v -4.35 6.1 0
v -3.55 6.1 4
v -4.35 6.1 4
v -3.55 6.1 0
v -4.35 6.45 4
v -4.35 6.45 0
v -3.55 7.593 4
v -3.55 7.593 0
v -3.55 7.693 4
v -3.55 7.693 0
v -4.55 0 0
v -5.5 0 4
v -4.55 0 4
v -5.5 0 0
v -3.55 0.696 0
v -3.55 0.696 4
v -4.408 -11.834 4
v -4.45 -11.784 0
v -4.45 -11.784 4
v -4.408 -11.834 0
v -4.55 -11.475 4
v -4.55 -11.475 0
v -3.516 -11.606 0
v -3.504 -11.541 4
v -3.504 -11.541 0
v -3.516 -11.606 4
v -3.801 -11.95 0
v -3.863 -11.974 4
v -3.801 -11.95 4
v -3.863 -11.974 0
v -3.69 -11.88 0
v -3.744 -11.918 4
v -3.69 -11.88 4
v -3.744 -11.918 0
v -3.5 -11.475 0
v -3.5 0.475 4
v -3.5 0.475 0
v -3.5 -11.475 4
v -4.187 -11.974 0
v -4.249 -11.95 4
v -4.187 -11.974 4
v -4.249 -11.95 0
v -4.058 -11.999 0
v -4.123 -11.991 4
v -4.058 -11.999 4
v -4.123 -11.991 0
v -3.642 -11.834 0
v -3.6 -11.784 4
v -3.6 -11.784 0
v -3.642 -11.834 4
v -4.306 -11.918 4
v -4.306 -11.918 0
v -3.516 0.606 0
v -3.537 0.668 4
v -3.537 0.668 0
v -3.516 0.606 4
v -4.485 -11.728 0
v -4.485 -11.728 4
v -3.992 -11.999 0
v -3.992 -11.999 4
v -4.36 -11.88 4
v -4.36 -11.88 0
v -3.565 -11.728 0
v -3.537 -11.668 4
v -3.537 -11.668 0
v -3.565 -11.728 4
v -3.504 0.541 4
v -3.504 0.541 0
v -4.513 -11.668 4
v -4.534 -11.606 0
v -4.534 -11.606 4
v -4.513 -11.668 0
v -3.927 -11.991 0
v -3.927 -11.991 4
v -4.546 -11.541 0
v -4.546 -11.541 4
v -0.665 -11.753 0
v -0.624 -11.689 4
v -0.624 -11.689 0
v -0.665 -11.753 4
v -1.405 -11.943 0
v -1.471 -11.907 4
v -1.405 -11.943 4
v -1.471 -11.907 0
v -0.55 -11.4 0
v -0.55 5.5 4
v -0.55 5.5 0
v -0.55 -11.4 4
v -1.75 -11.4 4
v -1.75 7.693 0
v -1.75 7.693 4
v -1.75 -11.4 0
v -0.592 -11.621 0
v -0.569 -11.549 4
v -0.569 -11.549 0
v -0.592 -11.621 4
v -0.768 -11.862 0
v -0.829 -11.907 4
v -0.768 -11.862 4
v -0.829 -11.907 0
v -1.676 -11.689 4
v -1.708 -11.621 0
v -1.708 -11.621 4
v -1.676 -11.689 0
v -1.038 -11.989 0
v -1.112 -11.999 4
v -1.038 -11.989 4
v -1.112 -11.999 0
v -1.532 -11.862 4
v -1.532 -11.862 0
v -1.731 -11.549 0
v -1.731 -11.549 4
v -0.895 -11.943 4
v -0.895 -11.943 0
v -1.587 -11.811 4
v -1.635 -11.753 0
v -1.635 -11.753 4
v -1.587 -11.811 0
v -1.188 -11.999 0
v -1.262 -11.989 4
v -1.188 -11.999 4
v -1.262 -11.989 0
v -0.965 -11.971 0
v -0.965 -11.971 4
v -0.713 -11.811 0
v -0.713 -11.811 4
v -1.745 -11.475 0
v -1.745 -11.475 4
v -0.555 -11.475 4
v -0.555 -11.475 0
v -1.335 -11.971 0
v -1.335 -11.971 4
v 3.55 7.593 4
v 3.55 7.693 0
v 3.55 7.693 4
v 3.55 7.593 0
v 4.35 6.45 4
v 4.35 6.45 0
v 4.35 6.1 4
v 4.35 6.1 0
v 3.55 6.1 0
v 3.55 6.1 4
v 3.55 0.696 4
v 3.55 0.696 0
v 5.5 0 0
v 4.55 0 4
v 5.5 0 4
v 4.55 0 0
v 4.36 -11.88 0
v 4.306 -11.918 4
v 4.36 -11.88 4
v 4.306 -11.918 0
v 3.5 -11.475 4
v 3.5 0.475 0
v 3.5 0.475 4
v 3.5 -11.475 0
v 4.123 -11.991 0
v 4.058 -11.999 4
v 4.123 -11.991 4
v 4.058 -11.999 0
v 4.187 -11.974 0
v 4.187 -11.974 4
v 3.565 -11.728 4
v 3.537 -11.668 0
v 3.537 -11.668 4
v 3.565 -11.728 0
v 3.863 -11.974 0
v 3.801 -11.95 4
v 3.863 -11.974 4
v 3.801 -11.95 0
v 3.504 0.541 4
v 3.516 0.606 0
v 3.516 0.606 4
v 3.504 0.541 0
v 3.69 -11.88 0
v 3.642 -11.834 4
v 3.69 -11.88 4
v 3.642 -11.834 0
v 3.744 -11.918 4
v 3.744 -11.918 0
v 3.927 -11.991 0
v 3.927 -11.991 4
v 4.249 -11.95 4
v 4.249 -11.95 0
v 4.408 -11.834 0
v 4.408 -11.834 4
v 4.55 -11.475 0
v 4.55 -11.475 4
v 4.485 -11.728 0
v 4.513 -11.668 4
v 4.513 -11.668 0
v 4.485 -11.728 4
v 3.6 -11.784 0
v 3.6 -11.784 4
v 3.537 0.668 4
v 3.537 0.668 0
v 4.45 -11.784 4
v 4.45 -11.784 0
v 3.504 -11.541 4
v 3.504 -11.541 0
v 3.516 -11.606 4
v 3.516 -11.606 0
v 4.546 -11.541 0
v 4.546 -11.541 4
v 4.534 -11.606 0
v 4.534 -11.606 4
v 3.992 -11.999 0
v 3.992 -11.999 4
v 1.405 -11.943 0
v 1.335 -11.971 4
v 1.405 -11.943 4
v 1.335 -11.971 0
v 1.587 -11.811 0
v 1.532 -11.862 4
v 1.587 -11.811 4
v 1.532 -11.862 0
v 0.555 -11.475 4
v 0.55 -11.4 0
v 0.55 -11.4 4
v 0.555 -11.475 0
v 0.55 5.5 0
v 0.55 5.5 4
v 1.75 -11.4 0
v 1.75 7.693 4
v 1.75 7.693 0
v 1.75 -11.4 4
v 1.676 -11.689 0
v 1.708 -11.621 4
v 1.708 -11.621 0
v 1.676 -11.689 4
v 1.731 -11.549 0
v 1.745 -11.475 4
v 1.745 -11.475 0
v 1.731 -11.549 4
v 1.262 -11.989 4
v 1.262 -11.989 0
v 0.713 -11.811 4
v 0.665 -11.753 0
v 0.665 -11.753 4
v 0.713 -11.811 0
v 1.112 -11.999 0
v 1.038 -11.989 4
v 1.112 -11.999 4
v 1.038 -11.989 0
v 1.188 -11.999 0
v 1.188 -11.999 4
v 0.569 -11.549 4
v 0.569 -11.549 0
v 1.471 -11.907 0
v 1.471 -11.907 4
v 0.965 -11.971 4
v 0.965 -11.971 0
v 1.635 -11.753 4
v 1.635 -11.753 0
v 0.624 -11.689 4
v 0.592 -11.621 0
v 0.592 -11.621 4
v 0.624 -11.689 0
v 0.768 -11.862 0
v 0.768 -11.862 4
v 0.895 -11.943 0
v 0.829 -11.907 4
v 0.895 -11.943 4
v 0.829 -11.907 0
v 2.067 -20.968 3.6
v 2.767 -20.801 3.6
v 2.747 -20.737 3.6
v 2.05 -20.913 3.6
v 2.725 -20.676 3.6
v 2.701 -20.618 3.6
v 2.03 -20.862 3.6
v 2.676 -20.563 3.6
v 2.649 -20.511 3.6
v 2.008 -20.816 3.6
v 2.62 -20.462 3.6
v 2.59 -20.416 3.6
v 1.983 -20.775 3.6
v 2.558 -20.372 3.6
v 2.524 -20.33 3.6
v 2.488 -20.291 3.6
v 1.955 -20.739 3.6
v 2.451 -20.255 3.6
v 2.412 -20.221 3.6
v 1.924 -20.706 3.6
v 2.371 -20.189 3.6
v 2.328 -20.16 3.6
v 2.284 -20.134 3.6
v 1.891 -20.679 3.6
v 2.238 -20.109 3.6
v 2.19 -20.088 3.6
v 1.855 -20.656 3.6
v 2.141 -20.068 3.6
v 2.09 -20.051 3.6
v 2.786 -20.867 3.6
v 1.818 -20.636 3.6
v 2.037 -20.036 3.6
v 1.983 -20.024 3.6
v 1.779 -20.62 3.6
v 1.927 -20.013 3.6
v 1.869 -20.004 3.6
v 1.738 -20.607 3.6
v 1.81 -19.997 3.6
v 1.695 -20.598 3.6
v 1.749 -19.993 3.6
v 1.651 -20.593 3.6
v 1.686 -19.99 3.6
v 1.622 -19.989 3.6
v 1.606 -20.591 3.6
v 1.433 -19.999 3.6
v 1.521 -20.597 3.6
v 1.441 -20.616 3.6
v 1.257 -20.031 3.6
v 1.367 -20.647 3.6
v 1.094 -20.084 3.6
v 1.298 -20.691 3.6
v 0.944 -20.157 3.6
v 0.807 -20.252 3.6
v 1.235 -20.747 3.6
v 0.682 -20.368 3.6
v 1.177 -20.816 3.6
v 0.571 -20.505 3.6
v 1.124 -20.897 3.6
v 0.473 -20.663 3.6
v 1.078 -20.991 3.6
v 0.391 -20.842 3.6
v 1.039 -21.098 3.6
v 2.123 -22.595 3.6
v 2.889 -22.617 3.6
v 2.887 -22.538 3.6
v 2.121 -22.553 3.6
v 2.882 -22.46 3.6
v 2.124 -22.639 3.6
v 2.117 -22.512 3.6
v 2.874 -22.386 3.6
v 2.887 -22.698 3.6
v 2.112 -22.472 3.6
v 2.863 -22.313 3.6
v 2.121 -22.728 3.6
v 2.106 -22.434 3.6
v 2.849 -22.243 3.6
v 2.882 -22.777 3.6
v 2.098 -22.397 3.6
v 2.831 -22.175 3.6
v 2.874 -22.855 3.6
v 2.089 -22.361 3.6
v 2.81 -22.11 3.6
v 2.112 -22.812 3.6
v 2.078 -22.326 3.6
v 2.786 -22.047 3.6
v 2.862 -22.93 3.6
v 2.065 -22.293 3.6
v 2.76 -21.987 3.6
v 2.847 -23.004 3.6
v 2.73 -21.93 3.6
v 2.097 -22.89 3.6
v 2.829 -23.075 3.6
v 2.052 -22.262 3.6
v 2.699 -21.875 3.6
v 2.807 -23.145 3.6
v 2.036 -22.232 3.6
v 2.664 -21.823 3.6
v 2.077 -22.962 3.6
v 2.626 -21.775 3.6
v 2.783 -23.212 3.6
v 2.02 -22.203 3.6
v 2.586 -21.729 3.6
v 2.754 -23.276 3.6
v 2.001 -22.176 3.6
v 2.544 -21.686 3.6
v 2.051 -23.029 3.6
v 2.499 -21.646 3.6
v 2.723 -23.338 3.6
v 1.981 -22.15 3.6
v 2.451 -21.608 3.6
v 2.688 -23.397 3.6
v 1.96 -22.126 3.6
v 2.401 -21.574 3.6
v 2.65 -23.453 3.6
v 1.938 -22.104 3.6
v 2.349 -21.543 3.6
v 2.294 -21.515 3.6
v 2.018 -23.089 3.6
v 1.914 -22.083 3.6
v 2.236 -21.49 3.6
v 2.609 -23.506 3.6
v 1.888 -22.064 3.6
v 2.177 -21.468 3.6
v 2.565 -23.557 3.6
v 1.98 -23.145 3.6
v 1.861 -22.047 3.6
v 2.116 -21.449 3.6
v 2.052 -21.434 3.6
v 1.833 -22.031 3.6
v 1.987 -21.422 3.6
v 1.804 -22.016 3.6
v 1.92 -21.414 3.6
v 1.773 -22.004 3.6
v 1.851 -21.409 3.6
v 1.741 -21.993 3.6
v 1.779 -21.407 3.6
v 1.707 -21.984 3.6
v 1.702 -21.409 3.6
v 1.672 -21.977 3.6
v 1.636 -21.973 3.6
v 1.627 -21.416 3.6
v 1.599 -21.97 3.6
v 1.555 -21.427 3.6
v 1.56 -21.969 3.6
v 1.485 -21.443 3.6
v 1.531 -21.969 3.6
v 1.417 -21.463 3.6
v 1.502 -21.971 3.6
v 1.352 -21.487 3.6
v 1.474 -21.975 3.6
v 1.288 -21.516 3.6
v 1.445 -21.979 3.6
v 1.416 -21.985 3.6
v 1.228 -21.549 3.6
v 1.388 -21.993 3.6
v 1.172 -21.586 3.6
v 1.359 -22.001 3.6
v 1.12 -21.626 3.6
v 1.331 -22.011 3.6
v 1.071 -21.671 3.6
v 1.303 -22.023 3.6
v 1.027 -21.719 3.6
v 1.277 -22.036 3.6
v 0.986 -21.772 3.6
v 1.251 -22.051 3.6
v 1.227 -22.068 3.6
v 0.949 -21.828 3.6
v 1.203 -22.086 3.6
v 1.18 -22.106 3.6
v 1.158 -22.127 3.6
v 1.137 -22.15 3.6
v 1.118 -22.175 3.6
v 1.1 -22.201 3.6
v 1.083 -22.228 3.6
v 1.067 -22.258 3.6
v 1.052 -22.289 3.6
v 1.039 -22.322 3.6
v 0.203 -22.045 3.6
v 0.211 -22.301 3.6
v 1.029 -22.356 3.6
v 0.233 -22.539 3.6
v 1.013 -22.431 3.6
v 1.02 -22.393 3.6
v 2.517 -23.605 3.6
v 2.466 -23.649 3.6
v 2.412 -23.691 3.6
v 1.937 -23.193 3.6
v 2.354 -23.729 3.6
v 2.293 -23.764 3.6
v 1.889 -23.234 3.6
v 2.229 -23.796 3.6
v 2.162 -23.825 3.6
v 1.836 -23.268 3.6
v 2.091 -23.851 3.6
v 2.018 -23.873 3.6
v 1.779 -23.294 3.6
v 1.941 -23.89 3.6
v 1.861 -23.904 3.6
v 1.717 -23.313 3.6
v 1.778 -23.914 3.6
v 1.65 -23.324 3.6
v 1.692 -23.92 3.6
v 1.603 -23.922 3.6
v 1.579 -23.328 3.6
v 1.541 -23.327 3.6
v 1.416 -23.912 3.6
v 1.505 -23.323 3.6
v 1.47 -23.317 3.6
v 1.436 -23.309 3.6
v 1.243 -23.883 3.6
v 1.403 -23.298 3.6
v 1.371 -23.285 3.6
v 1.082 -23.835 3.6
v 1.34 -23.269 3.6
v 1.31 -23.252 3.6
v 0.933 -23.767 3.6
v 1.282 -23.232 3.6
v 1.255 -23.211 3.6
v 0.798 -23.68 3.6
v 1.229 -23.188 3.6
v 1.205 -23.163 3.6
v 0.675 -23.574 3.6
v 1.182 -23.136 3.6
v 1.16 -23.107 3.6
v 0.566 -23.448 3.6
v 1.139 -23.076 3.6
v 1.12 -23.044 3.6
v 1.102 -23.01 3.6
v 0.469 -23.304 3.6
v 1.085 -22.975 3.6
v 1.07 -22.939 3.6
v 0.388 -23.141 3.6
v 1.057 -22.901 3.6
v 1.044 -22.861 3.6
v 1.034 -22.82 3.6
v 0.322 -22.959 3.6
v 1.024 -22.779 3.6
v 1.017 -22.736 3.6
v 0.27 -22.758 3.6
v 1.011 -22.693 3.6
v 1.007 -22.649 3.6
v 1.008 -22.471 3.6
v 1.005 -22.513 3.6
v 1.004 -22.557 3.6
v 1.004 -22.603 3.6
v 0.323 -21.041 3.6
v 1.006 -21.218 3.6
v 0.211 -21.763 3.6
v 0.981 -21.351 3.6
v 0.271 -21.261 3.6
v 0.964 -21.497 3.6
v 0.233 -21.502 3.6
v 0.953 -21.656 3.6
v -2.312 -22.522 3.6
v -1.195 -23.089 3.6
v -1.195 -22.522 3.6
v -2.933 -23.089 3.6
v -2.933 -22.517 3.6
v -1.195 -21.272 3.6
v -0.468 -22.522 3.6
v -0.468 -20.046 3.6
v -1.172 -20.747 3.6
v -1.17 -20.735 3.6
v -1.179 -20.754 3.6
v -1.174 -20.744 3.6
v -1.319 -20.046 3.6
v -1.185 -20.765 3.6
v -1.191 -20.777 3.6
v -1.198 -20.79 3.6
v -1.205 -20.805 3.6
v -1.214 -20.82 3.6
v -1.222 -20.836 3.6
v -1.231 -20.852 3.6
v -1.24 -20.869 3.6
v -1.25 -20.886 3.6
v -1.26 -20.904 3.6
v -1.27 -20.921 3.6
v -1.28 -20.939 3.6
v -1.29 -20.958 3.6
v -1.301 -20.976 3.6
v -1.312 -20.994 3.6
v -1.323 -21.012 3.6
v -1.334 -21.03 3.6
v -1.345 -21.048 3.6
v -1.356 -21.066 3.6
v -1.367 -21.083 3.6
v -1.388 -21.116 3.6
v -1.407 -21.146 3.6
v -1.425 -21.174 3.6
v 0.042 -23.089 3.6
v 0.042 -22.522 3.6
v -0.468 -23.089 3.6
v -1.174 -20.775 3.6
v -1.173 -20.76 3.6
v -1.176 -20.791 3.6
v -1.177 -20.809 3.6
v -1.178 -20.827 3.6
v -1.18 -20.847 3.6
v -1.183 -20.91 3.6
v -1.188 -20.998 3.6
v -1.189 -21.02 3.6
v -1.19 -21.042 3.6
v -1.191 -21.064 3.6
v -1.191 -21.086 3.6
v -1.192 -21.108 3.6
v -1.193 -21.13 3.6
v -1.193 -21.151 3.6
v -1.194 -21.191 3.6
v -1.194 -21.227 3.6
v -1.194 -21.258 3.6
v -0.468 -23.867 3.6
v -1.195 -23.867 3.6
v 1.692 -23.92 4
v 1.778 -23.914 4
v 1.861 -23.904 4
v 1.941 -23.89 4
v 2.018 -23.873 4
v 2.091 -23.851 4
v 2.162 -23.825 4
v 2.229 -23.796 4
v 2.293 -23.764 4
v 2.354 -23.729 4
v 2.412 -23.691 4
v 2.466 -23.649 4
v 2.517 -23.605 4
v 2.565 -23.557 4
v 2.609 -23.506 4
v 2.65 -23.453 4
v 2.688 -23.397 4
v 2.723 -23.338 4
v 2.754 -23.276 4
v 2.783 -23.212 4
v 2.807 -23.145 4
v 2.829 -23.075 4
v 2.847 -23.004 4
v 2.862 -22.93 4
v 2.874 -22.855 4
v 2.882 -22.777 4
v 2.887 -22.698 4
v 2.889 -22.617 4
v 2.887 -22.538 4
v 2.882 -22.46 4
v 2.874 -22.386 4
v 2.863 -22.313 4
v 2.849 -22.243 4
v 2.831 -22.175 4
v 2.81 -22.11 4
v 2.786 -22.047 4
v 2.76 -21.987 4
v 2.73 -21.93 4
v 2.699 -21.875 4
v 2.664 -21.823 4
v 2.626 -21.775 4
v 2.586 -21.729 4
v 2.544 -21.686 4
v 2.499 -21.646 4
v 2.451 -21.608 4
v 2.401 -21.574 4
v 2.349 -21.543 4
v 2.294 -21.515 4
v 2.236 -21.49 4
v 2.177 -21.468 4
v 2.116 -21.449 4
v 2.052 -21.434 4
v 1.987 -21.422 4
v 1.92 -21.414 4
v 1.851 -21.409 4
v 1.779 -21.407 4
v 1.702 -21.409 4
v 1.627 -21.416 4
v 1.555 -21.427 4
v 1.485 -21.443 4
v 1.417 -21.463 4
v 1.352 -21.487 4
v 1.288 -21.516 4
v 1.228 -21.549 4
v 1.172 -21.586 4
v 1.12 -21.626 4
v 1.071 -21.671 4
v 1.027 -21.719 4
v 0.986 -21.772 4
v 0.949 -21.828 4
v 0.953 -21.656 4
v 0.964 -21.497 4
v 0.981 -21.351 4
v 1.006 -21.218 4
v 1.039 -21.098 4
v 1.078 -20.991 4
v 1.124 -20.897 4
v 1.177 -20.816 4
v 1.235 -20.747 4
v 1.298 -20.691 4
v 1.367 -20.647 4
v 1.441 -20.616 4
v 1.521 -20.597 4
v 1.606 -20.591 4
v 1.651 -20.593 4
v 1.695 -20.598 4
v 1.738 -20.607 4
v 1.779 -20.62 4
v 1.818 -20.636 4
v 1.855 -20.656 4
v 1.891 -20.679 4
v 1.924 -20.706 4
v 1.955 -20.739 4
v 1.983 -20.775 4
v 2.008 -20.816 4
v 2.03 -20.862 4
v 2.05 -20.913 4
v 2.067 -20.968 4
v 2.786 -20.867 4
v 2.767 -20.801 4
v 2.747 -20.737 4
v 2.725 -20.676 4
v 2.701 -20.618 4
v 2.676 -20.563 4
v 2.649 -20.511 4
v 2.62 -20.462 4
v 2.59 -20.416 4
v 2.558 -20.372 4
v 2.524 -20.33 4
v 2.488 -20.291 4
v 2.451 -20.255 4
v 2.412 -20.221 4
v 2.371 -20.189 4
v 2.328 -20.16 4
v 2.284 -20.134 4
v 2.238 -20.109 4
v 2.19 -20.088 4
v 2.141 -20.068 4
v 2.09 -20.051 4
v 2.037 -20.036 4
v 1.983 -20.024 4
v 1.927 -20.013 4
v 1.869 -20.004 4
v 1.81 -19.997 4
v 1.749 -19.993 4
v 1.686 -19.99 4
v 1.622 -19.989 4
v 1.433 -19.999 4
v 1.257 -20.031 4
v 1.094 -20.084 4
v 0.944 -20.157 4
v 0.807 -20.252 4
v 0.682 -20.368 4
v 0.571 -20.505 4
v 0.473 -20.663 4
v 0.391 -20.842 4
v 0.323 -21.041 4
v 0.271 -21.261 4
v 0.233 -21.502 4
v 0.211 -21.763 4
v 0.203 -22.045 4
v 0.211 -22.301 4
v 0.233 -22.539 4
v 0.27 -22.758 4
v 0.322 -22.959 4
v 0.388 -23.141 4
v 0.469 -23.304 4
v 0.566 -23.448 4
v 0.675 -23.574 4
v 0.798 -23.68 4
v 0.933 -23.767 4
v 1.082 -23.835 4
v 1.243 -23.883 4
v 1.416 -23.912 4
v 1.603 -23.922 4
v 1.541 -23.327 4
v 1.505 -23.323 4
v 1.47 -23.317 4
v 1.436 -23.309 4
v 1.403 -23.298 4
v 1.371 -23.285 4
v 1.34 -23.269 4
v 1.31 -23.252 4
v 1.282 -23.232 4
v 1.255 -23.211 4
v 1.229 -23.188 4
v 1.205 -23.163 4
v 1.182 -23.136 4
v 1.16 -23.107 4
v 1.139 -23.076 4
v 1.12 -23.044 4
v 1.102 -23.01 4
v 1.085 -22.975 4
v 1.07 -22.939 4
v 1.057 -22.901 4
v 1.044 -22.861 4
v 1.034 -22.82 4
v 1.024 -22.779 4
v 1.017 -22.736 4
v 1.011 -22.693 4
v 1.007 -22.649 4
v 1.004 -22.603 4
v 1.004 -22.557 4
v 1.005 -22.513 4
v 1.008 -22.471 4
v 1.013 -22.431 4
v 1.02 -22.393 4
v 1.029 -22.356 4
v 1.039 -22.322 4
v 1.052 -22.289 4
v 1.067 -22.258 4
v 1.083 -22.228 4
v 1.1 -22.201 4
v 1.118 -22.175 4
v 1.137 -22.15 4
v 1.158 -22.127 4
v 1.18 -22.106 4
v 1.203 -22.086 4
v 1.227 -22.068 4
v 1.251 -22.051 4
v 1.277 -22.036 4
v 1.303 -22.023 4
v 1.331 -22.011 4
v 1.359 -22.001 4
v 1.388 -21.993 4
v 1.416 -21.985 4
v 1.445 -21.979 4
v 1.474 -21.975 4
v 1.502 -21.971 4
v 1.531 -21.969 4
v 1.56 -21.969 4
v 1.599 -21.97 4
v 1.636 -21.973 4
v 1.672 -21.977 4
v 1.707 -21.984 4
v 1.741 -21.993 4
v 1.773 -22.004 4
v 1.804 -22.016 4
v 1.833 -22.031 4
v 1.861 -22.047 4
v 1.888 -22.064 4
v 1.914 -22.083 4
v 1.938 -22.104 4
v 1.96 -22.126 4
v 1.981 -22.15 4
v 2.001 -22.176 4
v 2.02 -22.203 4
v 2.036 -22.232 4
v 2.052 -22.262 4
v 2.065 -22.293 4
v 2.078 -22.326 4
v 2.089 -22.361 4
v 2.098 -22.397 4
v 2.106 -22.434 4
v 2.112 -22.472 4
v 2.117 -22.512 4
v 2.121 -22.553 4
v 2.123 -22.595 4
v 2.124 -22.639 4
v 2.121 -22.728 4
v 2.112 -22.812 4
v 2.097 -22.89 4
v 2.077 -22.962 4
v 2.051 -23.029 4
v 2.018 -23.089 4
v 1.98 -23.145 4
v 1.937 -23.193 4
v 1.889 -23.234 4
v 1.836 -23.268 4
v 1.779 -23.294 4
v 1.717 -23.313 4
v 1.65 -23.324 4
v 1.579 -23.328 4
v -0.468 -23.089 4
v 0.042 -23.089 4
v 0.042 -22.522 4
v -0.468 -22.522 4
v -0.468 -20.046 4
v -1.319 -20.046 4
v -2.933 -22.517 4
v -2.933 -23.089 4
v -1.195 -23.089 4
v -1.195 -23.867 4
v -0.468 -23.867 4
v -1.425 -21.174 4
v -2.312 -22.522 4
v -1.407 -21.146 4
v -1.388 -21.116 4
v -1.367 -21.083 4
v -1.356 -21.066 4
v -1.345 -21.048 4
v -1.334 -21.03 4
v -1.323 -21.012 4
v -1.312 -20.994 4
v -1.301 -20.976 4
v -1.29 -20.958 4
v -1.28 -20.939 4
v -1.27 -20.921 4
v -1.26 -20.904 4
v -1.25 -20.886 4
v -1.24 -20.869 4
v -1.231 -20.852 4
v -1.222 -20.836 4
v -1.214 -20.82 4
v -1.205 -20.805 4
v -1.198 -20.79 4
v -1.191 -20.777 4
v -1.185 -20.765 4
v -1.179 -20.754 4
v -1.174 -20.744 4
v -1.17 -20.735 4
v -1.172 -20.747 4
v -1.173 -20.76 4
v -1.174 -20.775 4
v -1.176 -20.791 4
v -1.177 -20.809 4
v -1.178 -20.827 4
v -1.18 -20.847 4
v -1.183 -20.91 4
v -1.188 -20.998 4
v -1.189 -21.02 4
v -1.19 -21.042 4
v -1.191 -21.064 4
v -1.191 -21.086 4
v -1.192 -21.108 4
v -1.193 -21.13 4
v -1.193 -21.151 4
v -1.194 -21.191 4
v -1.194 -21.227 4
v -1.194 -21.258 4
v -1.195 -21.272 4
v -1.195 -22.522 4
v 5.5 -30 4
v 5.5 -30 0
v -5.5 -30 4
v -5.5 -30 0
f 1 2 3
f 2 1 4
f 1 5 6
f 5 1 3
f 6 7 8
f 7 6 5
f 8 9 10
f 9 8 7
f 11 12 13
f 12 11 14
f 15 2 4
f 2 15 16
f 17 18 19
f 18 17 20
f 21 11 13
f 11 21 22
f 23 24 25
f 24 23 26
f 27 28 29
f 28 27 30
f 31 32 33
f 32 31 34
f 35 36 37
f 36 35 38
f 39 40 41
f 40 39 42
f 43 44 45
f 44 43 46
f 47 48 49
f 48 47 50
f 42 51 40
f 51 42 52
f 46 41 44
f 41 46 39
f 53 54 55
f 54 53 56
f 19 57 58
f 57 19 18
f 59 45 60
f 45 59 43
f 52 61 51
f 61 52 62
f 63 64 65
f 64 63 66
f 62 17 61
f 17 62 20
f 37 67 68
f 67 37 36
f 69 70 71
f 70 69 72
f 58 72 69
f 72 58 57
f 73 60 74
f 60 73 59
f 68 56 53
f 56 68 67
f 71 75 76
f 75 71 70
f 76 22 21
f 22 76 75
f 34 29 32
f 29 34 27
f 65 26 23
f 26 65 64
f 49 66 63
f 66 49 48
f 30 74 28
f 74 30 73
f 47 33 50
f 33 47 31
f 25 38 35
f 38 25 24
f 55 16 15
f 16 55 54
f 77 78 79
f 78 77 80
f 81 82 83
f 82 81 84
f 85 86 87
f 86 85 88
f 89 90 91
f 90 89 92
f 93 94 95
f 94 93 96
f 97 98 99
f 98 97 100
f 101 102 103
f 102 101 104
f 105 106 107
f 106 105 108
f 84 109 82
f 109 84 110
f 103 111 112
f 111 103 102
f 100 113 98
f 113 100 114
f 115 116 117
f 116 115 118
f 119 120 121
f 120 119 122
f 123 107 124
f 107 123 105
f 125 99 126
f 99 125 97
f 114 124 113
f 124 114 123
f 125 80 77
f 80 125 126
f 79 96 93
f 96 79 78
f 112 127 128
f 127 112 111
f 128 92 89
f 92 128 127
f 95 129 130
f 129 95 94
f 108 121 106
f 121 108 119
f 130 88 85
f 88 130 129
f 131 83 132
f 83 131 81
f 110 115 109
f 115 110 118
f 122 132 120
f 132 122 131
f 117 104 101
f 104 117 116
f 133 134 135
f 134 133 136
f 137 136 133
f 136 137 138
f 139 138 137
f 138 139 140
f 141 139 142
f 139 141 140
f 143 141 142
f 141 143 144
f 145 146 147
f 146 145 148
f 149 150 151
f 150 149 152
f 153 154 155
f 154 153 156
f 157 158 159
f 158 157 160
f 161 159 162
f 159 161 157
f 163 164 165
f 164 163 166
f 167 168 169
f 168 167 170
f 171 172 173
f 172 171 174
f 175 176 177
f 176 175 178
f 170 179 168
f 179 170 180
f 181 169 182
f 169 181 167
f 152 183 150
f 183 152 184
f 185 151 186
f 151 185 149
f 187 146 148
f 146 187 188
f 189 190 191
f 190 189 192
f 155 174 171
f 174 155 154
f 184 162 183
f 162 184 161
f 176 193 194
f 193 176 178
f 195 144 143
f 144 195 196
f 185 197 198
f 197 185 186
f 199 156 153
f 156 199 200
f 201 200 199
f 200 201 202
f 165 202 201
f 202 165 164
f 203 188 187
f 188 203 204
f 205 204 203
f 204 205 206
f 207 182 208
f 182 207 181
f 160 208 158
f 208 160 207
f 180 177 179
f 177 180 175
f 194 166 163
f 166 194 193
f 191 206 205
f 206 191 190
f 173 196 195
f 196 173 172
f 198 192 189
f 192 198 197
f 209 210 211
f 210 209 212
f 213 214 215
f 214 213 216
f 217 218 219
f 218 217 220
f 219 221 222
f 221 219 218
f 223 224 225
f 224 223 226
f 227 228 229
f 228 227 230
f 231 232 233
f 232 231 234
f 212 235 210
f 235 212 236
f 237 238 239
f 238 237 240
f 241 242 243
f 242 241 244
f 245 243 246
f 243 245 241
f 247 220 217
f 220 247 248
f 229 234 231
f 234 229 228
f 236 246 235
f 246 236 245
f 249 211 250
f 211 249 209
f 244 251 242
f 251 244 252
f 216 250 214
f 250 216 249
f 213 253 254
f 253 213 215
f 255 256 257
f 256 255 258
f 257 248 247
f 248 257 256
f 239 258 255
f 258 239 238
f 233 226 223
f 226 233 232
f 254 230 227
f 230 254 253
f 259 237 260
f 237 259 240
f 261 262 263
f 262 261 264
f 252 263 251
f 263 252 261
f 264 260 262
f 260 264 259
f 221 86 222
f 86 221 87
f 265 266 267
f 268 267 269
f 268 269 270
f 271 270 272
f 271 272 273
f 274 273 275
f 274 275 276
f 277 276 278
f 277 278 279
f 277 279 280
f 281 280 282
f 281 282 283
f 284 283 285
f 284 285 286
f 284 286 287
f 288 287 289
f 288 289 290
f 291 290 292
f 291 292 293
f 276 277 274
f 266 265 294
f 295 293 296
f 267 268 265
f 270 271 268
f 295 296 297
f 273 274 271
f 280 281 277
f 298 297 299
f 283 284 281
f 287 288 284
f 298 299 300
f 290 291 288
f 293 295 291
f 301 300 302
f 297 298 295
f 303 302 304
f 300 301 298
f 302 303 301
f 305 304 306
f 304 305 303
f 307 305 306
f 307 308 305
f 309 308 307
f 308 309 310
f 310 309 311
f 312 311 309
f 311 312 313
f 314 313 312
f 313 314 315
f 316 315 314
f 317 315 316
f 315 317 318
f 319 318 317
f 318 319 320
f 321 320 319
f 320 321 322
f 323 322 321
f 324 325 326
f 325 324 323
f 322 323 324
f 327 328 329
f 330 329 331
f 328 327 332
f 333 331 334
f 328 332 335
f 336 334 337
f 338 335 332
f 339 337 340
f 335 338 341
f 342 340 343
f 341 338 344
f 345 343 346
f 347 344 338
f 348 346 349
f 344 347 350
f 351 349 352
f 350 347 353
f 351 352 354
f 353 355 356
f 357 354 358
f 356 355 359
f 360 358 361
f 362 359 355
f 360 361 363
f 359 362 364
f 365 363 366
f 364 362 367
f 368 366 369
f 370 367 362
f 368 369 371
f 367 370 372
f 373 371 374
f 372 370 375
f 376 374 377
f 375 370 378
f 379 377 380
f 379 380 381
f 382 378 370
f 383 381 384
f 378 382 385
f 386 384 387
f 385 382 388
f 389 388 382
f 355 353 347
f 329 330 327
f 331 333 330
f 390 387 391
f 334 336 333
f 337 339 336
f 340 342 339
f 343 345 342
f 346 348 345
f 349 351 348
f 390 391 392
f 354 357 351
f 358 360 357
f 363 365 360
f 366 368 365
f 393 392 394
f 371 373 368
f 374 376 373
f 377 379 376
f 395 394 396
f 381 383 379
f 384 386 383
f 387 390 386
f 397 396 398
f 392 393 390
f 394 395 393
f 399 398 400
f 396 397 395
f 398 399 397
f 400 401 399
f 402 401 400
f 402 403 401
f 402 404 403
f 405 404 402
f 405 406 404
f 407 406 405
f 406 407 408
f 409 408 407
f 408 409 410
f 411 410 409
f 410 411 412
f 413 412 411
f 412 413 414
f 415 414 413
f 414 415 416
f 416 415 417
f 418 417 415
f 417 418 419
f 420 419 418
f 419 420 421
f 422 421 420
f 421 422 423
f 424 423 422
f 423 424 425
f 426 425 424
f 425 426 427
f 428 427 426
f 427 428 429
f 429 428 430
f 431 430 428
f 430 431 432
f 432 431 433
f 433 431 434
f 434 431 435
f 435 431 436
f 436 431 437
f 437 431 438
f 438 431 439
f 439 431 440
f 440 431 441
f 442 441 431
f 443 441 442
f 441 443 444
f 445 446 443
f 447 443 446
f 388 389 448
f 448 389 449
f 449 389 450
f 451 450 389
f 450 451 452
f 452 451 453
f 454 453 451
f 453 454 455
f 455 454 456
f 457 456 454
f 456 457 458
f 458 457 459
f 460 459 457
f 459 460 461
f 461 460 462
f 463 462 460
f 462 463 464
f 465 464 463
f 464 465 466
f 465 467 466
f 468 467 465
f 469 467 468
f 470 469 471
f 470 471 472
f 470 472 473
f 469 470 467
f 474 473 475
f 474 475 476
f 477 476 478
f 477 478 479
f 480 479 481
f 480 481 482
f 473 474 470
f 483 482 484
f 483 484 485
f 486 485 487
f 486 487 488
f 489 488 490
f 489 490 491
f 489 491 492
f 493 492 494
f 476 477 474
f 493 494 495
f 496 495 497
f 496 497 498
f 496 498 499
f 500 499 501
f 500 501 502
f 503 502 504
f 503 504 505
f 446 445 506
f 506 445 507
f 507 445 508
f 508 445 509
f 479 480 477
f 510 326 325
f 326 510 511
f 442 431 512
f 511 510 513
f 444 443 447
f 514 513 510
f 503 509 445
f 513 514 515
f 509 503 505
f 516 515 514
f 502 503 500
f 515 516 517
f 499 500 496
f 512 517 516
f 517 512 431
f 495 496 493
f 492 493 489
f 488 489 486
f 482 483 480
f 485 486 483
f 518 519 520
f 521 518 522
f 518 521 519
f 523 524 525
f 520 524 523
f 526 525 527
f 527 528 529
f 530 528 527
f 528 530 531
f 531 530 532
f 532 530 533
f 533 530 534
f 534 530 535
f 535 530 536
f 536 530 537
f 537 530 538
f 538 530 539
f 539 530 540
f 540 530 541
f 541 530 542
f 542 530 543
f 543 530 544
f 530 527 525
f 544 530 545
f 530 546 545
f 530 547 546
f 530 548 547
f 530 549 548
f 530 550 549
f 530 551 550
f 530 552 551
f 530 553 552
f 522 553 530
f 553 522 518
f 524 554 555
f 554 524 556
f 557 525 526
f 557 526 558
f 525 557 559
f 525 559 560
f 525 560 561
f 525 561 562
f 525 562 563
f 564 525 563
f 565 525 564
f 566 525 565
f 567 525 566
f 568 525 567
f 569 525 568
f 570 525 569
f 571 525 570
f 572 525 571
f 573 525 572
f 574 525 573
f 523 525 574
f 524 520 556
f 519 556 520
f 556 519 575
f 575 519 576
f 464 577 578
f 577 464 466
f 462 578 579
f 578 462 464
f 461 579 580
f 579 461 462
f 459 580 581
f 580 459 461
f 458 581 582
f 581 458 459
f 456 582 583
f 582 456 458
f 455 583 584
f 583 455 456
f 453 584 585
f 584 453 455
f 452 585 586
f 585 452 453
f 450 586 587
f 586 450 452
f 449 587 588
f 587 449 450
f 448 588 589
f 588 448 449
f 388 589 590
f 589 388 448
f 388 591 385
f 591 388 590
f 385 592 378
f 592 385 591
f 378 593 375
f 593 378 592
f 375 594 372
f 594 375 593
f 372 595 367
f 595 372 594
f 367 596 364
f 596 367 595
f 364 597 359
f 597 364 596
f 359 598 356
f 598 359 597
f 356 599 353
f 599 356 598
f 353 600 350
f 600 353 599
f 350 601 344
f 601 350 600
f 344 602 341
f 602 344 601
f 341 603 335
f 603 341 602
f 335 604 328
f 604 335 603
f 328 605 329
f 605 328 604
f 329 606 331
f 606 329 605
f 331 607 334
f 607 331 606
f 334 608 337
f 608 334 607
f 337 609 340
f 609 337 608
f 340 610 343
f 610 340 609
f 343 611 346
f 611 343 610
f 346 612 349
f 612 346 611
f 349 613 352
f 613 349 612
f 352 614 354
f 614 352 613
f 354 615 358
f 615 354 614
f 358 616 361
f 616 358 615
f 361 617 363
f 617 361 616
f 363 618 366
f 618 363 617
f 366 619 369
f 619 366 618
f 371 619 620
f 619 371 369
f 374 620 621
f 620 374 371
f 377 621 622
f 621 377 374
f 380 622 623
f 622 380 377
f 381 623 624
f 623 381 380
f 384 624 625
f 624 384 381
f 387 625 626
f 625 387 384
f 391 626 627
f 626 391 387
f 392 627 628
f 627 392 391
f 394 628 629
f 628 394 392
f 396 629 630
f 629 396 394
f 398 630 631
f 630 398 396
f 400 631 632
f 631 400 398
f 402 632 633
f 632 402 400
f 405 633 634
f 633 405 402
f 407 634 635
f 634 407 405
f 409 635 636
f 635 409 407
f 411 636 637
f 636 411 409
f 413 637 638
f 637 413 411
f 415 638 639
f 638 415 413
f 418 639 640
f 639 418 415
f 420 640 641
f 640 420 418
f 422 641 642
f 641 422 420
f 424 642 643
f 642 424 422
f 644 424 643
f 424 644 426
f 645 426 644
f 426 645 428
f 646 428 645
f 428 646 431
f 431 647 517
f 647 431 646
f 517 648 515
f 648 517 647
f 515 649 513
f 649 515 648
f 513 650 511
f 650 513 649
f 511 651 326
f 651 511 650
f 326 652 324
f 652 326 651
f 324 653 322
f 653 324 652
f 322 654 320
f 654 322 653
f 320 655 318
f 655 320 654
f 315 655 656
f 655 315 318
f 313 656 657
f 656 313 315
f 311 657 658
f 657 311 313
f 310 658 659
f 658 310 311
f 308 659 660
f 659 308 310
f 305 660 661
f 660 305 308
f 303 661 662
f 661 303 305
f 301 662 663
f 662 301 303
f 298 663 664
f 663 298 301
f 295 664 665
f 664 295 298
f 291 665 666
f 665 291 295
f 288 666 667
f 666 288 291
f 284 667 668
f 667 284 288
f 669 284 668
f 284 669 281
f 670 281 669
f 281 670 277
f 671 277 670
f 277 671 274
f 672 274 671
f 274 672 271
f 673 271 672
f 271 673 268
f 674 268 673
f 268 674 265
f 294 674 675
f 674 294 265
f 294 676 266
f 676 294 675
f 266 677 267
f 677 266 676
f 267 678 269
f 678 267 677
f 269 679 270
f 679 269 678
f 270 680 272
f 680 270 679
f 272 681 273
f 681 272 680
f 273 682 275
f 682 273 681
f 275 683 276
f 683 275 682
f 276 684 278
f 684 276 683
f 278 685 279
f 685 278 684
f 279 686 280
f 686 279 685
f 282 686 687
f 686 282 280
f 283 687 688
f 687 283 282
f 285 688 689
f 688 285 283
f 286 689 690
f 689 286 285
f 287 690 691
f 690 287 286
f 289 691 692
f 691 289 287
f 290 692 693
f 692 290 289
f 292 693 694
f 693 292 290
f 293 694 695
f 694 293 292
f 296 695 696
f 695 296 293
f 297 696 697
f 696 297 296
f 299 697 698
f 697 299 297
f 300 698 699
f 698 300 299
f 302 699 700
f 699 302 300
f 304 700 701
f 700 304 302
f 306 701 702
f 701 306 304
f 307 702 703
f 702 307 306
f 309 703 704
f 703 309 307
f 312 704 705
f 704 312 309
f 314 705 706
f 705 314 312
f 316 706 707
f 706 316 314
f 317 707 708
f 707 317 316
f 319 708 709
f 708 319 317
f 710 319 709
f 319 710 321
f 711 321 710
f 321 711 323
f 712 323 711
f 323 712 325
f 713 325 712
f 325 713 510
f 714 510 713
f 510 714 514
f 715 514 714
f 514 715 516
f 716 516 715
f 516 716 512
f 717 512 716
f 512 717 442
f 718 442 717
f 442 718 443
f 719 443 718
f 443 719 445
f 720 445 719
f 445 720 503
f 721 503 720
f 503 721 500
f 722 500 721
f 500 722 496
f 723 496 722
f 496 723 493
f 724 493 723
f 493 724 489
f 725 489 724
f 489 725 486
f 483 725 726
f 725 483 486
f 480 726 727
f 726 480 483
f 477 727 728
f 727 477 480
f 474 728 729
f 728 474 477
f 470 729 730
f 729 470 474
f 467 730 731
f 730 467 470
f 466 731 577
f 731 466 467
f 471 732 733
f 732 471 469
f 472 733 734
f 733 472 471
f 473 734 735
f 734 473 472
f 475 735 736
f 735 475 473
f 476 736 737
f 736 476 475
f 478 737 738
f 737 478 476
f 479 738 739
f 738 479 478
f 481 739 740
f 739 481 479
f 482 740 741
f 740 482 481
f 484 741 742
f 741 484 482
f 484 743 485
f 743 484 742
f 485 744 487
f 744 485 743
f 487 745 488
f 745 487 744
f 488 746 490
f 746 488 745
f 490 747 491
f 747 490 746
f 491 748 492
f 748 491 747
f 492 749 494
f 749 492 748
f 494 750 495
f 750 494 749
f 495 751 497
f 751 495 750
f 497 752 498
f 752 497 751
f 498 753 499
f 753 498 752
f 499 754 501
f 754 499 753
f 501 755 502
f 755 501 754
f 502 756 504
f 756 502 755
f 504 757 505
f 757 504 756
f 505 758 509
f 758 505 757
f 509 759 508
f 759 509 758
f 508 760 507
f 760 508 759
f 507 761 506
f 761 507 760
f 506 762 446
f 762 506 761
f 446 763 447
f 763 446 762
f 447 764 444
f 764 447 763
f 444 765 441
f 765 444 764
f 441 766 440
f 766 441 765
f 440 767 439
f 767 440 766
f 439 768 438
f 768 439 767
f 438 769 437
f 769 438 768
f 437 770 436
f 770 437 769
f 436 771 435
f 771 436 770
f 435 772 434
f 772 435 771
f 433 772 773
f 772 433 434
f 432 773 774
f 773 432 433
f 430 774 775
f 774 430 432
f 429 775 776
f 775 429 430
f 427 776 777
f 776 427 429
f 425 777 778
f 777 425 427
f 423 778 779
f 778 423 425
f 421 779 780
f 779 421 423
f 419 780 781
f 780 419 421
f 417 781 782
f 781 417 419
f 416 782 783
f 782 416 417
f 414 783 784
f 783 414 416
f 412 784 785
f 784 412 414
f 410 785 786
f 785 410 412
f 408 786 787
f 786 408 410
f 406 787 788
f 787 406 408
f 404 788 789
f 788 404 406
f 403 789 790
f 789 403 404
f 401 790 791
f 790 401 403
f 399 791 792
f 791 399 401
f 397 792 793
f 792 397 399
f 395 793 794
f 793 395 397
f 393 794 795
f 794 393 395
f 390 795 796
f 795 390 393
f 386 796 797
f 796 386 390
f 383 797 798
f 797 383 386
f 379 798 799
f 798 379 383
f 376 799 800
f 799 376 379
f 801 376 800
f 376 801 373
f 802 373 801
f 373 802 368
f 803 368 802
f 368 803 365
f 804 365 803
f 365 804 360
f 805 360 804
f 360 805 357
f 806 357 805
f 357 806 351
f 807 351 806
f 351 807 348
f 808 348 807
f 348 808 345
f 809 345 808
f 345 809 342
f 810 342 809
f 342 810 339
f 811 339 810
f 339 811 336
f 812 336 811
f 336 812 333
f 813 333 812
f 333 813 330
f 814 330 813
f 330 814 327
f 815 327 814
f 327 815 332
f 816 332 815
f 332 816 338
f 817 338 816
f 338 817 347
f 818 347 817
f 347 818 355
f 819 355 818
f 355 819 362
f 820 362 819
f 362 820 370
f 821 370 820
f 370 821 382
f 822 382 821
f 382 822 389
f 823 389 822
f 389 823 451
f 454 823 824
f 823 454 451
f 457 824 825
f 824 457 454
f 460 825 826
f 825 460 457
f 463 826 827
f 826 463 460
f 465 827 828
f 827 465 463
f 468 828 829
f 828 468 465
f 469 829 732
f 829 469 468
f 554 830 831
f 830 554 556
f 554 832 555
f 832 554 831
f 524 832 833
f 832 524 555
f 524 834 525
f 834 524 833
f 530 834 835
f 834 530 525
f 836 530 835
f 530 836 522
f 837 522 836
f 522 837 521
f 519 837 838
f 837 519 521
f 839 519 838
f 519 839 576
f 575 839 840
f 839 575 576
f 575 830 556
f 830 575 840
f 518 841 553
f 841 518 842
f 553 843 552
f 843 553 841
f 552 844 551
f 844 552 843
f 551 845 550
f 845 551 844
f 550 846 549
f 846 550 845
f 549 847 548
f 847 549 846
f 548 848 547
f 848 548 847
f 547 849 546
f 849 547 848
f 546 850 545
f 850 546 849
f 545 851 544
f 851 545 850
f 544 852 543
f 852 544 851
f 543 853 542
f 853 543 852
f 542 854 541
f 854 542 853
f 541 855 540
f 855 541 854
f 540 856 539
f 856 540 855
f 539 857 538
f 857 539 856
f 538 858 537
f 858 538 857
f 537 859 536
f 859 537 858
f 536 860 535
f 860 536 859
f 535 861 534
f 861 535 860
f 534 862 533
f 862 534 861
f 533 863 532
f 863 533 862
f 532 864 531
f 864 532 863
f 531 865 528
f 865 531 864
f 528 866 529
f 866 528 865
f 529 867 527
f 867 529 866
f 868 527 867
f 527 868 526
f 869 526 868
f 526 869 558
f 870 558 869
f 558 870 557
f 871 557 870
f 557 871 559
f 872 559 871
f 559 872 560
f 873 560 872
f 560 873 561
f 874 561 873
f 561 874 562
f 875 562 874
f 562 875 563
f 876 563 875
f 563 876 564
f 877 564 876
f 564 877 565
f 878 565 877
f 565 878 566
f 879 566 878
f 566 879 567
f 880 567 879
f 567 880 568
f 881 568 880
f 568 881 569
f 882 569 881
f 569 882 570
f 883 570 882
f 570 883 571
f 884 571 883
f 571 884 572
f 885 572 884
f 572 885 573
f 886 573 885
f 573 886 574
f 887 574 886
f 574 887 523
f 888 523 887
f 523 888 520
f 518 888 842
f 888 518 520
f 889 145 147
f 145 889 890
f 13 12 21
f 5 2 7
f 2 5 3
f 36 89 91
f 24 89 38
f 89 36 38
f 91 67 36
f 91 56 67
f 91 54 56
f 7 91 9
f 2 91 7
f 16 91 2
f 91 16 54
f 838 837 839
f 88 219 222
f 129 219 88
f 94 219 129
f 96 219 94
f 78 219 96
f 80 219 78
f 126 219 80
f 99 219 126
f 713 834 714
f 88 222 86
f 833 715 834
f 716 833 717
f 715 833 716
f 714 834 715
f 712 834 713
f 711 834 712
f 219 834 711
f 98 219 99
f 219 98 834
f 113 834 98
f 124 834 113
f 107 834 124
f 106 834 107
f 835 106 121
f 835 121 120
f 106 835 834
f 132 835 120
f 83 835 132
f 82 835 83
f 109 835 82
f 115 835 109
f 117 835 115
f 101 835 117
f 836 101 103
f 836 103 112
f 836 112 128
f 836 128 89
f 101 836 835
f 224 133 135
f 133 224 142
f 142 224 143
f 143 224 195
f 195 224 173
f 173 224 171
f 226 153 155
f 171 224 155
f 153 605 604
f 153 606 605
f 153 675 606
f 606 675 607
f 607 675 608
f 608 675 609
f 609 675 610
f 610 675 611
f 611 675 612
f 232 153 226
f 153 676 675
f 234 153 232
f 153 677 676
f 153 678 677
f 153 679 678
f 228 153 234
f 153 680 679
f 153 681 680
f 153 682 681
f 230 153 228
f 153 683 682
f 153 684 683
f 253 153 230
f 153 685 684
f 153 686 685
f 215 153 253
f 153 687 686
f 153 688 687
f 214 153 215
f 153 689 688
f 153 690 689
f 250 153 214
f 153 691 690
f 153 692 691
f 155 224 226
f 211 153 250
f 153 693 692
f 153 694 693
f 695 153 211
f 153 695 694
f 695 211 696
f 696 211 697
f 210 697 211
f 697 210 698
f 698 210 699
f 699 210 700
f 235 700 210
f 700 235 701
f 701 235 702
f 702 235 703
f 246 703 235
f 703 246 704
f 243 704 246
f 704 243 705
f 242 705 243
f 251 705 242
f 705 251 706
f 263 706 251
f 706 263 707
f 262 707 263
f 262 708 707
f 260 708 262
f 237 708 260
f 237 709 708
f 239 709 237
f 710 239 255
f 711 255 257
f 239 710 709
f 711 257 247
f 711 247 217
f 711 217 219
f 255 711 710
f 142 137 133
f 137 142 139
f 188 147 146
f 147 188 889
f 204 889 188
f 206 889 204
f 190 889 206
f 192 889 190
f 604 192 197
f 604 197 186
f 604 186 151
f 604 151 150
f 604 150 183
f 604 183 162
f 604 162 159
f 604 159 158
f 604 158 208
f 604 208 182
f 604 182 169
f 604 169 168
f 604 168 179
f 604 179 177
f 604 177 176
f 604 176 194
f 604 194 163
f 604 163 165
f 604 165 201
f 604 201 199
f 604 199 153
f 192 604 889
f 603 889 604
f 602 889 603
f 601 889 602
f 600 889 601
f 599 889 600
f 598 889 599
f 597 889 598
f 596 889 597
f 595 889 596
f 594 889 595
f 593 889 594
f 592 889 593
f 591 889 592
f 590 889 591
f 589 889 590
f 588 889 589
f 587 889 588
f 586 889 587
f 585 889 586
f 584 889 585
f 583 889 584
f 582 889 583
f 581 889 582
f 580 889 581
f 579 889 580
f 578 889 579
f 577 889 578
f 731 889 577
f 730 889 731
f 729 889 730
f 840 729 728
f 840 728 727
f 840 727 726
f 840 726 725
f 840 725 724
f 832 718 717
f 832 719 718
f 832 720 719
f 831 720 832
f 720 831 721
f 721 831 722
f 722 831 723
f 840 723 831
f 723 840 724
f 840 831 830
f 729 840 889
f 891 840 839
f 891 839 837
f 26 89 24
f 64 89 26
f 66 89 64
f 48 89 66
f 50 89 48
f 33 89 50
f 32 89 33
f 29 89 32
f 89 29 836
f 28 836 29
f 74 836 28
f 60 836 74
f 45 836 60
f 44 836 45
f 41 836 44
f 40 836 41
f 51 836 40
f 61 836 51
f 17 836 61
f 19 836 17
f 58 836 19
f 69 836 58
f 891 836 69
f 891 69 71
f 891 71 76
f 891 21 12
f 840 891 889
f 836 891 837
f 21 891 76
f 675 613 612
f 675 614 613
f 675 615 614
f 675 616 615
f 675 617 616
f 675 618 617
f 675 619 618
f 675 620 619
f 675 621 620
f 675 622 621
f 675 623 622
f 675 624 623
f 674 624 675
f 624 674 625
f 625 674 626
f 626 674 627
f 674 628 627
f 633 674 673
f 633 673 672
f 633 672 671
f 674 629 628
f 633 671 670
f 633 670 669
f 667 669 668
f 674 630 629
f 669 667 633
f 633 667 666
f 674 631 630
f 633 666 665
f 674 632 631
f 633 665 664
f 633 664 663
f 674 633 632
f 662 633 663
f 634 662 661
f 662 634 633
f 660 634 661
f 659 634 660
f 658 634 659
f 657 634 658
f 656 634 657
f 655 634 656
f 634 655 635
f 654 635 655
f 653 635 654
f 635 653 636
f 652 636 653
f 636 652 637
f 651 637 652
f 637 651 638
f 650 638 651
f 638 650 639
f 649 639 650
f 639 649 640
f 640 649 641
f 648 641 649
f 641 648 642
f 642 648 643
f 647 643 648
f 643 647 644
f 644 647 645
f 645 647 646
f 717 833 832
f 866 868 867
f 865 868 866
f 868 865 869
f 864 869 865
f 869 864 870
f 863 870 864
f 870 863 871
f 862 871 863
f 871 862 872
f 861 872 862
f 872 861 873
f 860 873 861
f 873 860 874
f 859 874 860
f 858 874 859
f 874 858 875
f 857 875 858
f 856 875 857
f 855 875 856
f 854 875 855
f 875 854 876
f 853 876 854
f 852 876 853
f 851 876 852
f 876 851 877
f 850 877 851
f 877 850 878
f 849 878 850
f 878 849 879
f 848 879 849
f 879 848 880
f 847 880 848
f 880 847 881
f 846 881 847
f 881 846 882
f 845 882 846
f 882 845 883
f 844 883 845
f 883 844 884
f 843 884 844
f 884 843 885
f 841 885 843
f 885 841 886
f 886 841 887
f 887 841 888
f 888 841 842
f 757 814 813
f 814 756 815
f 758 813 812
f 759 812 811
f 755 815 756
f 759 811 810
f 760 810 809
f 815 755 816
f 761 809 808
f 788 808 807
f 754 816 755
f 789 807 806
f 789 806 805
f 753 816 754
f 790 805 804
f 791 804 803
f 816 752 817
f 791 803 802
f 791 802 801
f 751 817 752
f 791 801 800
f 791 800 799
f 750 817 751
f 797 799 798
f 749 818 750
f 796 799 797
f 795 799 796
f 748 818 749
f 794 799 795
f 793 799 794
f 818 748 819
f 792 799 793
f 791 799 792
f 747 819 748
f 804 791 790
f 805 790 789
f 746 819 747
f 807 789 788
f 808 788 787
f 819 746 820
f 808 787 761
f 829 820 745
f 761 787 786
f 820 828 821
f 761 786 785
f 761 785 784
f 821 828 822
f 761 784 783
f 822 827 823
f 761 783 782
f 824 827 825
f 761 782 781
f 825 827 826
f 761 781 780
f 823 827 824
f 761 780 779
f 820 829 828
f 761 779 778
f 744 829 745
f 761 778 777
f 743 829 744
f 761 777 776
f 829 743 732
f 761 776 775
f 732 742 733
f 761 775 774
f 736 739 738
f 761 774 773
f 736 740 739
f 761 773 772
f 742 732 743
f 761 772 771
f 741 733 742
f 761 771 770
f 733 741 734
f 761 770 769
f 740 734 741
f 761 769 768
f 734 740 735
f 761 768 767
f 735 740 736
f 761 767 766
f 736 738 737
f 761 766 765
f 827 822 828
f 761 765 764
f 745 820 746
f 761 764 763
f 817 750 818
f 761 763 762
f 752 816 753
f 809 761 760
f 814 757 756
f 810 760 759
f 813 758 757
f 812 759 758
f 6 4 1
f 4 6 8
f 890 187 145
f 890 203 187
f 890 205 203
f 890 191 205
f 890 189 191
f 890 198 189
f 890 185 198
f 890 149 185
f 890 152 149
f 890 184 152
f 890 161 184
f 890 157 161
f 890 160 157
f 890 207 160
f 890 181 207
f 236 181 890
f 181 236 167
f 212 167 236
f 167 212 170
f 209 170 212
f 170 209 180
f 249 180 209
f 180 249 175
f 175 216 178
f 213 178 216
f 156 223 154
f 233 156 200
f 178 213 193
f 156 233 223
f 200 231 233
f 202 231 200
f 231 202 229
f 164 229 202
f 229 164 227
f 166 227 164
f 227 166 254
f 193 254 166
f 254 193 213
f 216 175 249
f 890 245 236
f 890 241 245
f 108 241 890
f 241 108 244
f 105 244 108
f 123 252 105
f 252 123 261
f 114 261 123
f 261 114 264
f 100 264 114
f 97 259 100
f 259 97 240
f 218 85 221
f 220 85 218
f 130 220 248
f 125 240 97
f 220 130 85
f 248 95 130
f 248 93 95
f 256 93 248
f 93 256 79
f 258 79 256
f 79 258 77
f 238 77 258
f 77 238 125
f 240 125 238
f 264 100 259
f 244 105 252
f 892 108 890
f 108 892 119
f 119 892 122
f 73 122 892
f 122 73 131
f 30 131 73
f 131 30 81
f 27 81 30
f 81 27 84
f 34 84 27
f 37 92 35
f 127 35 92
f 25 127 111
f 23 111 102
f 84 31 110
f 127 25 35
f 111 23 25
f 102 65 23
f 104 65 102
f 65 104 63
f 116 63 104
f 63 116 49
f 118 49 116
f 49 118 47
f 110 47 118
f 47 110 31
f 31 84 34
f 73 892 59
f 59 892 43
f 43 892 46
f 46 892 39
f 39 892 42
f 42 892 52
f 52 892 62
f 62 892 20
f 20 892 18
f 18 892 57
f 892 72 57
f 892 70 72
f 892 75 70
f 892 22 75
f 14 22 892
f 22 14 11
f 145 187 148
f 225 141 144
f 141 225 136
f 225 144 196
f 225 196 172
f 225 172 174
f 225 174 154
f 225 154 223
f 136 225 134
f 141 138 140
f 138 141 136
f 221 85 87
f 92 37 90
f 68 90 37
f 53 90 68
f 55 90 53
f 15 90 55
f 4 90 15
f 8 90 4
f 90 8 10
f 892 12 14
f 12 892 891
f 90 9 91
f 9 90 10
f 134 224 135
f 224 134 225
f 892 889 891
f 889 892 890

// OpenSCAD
$fn = 50;

difference() {
	union() {
		translate(v = [0, 0, 0]) {
			rotate(a = [0, 0, 0]) {
				difference() {
					union() {
						translate(v = [-5.5, -30.0, 0]) {
							cube(size = [11.0, 37.69251840539369, 4.0]);
						}
					}
					union() {
						translate(v = [0, 0, -0.1]) {
							linear_extrude(height = 4.2) {
								polygon(points = [[-3.55, 0], [-3.55, 6.1], [-4.35, 6.1], [-4.35, 6.449999999999999], [-3.55, 7.592518405393691], [-3.55, 8.692518405393692], [-5.7, 8.692518405393692], [-5.7, 0]]);
							}
						}
						translate(v = [-4.0249999999999995, -5.5, -0.1]) {
							hull() {
								translate(v = [-0.0, 5.975, 0]) {
									cylinder(h = 4.2, r = 0.525);
								}
								translate(v = [0.0, 5.975, 0]) {
									cylinder(h = 4.2, r = 0.525);
								}
								translate(v = [-0.0, -5.975, 0]) {
									cylinder(h = 4.2, r = 0.525);
								}
								translate(v = [0.0, -5.975, 0]) {
									cylinder(h = 4.2, r = 0.525);
								}
							}
						}
						translate(v = [-1.15, -1.6537407973031542, -0.1]) {
							hull() {
								translate(v = [-0.0, 9.746259202696846, 0]) {
									cylinder(h = 4.2, r = 0.5999999999999999);
								}
								translate(v = [0.0, 9.746259202696846, 0]) {
									cylinder(h = 4.2, r = 0.5999999999999999);
								}
								translate(v = [-0.0, -9.746259202696846, 0]) {
									cylinder(h = 4.2, r = 0.5999999999999999);
								}
								translate(v = [0.0, -9.746259202696846, 0]) {
									cylinder(h = 4.2, r = 0.5999999999999999);
								}
							}
						}
						translate(v = [0, 0, -0.1]) {
							linear_extrude(height = 4.2) {
								polygon(points = [[3.55, 0], [3.55, 6.1], [4.35, 6.1], [4.35, 6.449999999999999], [3.55, 7.592518405393691], [3.55, 8.692518405393692], [5.7, 8.692518405393692], [5.7, 0]]);
							}
						}
						translate(v = [4.0249999999999995, -5.5, -0.1]) {
							hull() {
								translate(v = [-0.0, 5.975, 0]) {
									cylinder(h = 4.2, r = 0.525);
								}
								translate(v = [0.0, 5.975, 0]) {
									cylinder(h = 4.2, r = 0.525);
								}
								translate(v = [-0.0, -5.975, 0]) {
									cylinder(h = 4.2, r = 0.525);
								}
								translate(v = [0.0, -5.975, 0]) {
									cylinder(h = 4.2, r = 0.525);
								}
							}
						}
						translate(v = [1.15, -1.6537407973031542, -0.1]) {
							hull() {
								translate(v = [-0.0, 9.746259202696846, 0]) {
									cylinder(h = 4.2, r = 0.5999999999999999);
								}
								translate(v = [0.0, 9.746259202696846, 0]) {
									cylinder(h = 4.2, r = 0.5999999999999999);
								}
								translate(v = [-0.0, -9.746259202696846, 0]) {
									cylinder(h = 4.2, r = 0.5999999999999999);
								}
								translate(v = [0.0, -9.746259202696846, 0]) {
									cylinder(h = 4.2, r = 0.5999999999999999);
								}
							}
						}
						translate(v = [-0.6000000000000001, 5.5, -0.1]) {
							cube(size = [1.2000000000000002, 3.192518405393691, 4.2]);
						}
						translate(v = [0, -22, 3.6]) {
							linear_extrude(height = 0.5) {
								text(font = "Arial:style=Bold", halign = "center", size = 4.0, text = "46", valign = "center");
							}
						}
					}
				}
			}
		}
	}
	union();
}
